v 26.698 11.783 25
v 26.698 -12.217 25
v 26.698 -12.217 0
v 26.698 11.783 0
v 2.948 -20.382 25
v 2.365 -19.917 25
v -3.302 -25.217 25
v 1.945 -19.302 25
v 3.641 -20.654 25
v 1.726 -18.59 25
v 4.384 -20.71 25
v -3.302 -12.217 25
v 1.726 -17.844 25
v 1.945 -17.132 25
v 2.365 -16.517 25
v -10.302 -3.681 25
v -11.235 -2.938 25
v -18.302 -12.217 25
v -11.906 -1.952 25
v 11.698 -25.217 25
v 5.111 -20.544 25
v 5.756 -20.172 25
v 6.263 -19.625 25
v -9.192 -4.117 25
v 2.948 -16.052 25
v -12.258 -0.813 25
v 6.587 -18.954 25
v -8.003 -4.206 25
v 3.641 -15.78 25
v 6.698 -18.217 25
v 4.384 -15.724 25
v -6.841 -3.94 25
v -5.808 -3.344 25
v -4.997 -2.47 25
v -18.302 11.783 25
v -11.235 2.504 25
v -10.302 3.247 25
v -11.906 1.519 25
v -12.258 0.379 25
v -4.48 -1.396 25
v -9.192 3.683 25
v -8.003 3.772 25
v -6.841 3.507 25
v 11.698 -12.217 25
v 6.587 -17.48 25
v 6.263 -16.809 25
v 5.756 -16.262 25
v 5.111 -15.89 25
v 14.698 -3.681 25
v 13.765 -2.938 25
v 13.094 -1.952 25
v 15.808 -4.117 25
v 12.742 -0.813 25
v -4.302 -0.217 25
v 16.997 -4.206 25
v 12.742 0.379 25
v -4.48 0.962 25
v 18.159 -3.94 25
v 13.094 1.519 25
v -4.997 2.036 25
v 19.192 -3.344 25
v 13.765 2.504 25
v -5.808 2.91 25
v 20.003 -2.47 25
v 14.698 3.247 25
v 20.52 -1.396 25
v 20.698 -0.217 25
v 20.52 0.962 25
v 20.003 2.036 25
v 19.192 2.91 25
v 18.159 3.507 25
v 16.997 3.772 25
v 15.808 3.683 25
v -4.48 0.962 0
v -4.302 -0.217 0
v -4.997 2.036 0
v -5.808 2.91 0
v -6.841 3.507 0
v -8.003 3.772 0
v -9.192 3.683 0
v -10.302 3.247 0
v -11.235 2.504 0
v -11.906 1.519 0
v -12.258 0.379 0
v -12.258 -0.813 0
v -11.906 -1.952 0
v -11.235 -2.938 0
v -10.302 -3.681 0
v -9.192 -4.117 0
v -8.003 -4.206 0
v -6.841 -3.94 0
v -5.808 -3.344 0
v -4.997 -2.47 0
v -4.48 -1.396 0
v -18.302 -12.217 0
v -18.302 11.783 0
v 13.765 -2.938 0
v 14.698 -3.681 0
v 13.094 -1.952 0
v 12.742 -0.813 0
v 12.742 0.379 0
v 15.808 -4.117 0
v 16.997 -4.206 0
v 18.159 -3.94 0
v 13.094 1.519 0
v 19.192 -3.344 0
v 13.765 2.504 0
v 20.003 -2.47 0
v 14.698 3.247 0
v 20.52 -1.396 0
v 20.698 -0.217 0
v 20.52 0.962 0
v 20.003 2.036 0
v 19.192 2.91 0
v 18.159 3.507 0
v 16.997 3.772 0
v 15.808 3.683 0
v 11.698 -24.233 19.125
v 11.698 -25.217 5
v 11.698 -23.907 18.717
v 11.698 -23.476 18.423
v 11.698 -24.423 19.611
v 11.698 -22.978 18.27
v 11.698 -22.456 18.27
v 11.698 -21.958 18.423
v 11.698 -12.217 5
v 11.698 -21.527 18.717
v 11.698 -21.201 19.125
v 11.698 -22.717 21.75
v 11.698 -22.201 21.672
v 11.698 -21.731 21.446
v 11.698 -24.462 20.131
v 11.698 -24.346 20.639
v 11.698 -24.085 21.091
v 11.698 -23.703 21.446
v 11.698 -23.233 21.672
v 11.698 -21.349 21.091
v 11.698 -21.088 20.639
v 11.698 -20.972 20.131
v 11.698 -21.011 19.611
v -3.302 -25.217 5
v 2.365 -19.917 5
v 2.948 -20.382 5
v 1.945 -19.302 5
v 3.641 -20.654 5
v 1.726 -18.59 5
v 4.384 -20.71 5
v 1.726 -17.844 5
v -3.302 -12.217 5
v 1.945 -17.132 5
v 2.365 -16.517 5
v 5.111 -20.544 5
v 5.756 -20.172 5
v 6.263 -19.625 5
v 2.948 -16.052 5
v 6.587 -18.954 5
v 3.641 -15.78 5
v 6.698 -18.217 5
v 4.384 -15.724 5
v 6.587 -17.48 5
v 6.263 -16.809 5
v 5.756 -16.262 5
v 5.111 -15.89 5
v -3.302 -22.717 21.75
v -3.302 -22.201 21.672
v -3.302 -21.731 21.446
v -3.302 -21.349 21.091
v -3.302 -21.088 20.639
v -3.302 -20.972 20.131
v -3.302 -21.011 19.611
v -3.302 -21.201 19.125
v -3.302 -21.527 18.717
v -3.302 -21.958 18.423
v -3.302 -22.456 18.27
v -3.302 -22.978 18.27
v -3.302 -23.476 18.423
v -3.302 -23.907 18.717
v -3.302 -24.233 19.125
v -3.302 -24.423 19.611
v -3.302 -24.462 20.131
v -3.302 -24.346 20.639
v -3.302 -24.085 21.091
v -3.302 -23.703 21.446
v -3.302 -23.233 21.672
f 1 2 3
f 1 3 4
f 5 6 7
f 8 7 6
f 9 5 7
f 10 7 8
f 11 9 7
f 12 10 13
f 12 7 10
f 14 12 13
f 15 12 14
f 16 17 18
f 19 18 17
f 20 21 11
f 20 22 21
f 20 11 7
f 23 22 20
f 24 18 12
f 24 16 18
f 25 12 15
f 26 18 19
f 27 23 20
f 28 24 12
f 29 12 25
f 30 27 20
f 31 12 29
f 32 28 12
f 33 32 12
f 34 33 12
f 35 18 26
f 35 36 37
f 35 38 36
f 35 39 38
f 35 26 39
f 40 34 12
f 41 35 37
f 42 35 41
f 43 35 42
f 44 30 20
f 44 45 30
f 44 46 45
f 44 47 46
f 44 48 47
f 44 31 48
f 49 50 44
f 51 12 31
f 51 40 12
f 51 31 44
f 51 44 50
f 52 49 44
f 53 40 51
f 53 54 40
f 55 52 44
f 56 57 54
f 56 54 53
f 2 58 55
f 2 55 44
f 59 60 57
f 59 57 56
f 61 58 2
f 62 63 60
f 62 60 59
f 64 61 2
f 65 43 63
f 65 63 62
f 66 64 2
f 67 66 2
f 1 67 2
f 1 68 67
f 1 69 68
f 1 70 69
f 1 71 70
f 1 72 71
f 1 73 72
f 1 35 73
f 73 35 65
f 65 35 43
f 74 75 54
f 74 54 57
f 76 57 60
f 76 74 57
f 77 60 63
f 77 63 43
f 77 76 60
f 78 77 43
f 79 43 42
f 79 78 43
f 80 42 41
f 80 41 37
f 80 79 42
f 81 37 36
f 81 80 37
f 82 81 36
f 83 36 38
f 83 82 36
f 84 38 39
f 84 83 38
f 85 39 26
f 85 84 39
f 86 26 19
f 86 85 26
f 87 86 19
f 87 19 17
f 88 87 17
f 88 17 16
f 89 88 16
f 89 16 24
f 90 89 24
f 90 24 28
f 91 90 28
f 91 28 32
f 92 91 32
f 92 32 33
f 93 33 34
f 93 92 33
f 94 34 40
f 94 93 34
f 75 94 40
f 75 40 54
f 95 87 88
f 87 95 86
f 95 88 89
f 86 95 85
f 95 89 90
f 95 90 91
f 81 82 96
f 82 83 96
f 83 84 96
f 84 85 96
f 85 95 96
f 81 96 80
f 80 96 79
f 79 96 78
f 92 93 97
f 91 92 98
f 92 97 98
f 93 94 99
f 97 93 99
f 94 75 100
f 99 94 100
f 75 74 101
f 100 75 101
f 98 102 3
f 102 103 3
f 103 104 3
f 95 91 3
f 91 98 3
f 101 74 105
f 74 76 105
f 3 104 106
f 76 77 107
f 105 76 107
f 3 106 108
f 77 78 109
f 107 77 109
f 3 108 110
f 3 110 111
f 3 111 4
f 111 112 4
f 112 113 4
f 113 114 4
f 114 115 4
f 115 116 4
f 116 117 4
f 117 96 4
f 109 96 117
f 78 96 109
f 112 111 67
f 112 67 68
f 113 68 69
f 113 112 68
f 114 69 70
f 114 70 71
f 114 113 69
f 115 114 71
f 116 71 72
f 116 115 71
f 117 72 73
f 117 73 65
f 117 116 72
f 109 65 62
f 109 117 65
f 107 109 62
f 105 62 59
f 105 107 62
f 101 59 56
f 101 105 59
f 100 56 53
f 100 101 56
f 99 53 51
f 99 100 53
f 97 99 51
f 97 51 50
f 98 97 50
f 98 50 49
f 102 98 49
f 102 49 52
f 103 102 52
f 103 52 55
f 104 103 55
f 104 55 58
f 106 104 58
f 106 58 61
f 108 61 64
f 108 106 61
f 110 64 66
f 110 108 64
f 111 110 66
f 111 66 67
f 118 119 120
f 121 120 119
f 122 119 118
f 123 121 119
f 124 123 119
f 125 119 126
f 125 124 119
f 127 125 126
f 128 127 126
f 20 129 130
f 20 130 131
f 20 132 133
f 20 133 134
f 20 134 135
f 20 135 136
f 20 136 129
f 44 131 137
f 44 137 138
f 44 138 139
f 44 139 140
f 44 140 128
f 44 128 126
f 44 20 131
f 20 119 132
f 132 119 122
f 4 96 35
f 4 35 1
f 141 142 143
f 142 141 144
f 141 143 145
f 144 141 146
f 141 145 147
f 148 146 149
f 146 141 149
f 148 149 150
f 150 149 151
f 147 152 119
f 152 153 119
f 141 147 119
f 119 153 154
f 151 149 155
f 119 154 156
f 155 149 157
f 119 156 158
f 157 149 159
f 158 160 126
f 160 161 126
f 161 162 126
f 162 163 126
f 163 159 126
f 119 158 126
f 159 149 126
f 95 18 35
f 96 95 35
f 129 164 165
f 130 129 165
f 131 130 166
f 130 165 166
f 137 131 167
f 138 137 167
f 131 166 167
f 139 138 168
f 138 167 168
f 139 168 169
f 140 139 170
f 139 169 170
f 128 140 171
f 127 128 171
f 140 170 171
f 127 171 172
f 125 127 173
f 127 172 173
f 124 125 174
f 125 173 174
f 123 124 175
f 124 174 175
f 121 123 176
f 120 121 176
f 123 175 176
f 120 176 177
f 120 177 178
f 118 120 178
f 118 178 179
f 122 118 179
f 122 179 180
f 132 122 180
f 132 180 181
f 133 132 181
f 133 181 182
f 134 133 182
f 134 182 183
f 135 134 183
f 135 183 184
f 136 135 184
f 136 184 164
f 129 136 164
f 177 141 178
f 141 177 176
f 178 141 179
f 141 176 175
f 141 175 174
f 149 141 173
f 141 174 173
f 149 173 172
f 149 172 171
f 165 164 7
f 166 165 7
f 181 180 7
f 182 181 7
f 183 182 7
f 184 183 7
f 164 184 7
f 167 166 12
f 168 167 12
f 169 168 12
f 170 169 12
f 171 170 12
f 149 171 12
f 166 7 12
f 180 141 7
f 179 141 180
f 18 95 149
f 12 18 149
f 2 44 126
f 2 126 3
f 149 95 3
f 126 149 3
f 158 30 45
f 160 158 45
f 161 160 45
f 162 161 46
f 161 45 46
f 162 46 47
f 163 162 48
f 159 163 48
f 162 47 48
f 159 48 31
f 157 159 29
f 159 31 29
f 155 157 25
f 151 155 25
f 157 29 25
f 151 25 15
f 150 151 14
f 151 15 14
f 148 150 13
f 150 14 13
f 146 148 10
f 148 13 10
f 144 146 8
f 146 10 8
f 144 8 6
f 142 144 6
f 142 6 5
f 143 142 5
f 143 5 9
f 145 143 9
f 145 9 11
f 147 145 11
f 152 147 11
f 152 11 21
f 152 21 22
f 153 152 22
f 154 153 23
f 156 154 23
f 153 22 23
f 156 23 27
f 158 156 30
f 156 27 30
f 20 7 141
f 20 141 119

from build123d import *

# Parameters (mm, degrees)
ESQUISSE1_W             = 45
ESQUISSE1_H             = 24
ESQUISSE1_R             = 4
BOSS_EXTRU_1_DEPTH      = 25
ESQUISSE2_W             = 15
ESQUISSE2_H             = 13
ESQUISSE2_R             = 2.5
BOSS_EXTRU_2_DEPTH      = 20
ESQUISSE3_R             = 1.75
ENL_V_MAT_EXTRU_1_DEPTH = 20


with BuildPart() as part:
    # Esquisse1 → Boss.-Extru.1 (new body)
    with BuildSketch(Plane.XY):
        with Locations((4.197614073, -0.216957606)):
            Rectangle(ESQUISSE1_W, ESQUISSE1_H)
        with Locations((-8.302385927, -0.216957606)):
            Circle(ESQUISSE1_R, mode=Mode.SUBTRACT)
        with Locations((16.697614073, -0.216957606)):
            Circle(ESQUISSE1_R, mode=Mode.SUBTRACT)
    extrude(amount=BOSS_EXTRU_1_DEPTH)

    # Esquisse2 → Boss.-Extru.2 (add)
    with BuildSketch(Plane.XY.offset(25)):
        with Locations((4.197614073, -18.716957606)):
            Rectangle(ESQUISSE2_W, ESQUISSE2_H)
        with Locations((4.197614073, -18.216957606)):
            Circle(ESQUISSE2_R, mode=Mode.SUBTRACT)
    extrude(amount=-BOSS_EXTRU_2_DEPTH)

    # Esquisse3 → Enlèv. mat.-Extru.1 (cut)
    with BuildSketch(Plane.ZY.offset(3.302385927)):
        with Locations((20, -22.716957606)):
            Circle(ESQUISSE3_R)
    extrude(amount=-ENL_V_MAT_EXTRU_1_DEPTH, mode=Mode.SUBTRACT)


solid = part.part
